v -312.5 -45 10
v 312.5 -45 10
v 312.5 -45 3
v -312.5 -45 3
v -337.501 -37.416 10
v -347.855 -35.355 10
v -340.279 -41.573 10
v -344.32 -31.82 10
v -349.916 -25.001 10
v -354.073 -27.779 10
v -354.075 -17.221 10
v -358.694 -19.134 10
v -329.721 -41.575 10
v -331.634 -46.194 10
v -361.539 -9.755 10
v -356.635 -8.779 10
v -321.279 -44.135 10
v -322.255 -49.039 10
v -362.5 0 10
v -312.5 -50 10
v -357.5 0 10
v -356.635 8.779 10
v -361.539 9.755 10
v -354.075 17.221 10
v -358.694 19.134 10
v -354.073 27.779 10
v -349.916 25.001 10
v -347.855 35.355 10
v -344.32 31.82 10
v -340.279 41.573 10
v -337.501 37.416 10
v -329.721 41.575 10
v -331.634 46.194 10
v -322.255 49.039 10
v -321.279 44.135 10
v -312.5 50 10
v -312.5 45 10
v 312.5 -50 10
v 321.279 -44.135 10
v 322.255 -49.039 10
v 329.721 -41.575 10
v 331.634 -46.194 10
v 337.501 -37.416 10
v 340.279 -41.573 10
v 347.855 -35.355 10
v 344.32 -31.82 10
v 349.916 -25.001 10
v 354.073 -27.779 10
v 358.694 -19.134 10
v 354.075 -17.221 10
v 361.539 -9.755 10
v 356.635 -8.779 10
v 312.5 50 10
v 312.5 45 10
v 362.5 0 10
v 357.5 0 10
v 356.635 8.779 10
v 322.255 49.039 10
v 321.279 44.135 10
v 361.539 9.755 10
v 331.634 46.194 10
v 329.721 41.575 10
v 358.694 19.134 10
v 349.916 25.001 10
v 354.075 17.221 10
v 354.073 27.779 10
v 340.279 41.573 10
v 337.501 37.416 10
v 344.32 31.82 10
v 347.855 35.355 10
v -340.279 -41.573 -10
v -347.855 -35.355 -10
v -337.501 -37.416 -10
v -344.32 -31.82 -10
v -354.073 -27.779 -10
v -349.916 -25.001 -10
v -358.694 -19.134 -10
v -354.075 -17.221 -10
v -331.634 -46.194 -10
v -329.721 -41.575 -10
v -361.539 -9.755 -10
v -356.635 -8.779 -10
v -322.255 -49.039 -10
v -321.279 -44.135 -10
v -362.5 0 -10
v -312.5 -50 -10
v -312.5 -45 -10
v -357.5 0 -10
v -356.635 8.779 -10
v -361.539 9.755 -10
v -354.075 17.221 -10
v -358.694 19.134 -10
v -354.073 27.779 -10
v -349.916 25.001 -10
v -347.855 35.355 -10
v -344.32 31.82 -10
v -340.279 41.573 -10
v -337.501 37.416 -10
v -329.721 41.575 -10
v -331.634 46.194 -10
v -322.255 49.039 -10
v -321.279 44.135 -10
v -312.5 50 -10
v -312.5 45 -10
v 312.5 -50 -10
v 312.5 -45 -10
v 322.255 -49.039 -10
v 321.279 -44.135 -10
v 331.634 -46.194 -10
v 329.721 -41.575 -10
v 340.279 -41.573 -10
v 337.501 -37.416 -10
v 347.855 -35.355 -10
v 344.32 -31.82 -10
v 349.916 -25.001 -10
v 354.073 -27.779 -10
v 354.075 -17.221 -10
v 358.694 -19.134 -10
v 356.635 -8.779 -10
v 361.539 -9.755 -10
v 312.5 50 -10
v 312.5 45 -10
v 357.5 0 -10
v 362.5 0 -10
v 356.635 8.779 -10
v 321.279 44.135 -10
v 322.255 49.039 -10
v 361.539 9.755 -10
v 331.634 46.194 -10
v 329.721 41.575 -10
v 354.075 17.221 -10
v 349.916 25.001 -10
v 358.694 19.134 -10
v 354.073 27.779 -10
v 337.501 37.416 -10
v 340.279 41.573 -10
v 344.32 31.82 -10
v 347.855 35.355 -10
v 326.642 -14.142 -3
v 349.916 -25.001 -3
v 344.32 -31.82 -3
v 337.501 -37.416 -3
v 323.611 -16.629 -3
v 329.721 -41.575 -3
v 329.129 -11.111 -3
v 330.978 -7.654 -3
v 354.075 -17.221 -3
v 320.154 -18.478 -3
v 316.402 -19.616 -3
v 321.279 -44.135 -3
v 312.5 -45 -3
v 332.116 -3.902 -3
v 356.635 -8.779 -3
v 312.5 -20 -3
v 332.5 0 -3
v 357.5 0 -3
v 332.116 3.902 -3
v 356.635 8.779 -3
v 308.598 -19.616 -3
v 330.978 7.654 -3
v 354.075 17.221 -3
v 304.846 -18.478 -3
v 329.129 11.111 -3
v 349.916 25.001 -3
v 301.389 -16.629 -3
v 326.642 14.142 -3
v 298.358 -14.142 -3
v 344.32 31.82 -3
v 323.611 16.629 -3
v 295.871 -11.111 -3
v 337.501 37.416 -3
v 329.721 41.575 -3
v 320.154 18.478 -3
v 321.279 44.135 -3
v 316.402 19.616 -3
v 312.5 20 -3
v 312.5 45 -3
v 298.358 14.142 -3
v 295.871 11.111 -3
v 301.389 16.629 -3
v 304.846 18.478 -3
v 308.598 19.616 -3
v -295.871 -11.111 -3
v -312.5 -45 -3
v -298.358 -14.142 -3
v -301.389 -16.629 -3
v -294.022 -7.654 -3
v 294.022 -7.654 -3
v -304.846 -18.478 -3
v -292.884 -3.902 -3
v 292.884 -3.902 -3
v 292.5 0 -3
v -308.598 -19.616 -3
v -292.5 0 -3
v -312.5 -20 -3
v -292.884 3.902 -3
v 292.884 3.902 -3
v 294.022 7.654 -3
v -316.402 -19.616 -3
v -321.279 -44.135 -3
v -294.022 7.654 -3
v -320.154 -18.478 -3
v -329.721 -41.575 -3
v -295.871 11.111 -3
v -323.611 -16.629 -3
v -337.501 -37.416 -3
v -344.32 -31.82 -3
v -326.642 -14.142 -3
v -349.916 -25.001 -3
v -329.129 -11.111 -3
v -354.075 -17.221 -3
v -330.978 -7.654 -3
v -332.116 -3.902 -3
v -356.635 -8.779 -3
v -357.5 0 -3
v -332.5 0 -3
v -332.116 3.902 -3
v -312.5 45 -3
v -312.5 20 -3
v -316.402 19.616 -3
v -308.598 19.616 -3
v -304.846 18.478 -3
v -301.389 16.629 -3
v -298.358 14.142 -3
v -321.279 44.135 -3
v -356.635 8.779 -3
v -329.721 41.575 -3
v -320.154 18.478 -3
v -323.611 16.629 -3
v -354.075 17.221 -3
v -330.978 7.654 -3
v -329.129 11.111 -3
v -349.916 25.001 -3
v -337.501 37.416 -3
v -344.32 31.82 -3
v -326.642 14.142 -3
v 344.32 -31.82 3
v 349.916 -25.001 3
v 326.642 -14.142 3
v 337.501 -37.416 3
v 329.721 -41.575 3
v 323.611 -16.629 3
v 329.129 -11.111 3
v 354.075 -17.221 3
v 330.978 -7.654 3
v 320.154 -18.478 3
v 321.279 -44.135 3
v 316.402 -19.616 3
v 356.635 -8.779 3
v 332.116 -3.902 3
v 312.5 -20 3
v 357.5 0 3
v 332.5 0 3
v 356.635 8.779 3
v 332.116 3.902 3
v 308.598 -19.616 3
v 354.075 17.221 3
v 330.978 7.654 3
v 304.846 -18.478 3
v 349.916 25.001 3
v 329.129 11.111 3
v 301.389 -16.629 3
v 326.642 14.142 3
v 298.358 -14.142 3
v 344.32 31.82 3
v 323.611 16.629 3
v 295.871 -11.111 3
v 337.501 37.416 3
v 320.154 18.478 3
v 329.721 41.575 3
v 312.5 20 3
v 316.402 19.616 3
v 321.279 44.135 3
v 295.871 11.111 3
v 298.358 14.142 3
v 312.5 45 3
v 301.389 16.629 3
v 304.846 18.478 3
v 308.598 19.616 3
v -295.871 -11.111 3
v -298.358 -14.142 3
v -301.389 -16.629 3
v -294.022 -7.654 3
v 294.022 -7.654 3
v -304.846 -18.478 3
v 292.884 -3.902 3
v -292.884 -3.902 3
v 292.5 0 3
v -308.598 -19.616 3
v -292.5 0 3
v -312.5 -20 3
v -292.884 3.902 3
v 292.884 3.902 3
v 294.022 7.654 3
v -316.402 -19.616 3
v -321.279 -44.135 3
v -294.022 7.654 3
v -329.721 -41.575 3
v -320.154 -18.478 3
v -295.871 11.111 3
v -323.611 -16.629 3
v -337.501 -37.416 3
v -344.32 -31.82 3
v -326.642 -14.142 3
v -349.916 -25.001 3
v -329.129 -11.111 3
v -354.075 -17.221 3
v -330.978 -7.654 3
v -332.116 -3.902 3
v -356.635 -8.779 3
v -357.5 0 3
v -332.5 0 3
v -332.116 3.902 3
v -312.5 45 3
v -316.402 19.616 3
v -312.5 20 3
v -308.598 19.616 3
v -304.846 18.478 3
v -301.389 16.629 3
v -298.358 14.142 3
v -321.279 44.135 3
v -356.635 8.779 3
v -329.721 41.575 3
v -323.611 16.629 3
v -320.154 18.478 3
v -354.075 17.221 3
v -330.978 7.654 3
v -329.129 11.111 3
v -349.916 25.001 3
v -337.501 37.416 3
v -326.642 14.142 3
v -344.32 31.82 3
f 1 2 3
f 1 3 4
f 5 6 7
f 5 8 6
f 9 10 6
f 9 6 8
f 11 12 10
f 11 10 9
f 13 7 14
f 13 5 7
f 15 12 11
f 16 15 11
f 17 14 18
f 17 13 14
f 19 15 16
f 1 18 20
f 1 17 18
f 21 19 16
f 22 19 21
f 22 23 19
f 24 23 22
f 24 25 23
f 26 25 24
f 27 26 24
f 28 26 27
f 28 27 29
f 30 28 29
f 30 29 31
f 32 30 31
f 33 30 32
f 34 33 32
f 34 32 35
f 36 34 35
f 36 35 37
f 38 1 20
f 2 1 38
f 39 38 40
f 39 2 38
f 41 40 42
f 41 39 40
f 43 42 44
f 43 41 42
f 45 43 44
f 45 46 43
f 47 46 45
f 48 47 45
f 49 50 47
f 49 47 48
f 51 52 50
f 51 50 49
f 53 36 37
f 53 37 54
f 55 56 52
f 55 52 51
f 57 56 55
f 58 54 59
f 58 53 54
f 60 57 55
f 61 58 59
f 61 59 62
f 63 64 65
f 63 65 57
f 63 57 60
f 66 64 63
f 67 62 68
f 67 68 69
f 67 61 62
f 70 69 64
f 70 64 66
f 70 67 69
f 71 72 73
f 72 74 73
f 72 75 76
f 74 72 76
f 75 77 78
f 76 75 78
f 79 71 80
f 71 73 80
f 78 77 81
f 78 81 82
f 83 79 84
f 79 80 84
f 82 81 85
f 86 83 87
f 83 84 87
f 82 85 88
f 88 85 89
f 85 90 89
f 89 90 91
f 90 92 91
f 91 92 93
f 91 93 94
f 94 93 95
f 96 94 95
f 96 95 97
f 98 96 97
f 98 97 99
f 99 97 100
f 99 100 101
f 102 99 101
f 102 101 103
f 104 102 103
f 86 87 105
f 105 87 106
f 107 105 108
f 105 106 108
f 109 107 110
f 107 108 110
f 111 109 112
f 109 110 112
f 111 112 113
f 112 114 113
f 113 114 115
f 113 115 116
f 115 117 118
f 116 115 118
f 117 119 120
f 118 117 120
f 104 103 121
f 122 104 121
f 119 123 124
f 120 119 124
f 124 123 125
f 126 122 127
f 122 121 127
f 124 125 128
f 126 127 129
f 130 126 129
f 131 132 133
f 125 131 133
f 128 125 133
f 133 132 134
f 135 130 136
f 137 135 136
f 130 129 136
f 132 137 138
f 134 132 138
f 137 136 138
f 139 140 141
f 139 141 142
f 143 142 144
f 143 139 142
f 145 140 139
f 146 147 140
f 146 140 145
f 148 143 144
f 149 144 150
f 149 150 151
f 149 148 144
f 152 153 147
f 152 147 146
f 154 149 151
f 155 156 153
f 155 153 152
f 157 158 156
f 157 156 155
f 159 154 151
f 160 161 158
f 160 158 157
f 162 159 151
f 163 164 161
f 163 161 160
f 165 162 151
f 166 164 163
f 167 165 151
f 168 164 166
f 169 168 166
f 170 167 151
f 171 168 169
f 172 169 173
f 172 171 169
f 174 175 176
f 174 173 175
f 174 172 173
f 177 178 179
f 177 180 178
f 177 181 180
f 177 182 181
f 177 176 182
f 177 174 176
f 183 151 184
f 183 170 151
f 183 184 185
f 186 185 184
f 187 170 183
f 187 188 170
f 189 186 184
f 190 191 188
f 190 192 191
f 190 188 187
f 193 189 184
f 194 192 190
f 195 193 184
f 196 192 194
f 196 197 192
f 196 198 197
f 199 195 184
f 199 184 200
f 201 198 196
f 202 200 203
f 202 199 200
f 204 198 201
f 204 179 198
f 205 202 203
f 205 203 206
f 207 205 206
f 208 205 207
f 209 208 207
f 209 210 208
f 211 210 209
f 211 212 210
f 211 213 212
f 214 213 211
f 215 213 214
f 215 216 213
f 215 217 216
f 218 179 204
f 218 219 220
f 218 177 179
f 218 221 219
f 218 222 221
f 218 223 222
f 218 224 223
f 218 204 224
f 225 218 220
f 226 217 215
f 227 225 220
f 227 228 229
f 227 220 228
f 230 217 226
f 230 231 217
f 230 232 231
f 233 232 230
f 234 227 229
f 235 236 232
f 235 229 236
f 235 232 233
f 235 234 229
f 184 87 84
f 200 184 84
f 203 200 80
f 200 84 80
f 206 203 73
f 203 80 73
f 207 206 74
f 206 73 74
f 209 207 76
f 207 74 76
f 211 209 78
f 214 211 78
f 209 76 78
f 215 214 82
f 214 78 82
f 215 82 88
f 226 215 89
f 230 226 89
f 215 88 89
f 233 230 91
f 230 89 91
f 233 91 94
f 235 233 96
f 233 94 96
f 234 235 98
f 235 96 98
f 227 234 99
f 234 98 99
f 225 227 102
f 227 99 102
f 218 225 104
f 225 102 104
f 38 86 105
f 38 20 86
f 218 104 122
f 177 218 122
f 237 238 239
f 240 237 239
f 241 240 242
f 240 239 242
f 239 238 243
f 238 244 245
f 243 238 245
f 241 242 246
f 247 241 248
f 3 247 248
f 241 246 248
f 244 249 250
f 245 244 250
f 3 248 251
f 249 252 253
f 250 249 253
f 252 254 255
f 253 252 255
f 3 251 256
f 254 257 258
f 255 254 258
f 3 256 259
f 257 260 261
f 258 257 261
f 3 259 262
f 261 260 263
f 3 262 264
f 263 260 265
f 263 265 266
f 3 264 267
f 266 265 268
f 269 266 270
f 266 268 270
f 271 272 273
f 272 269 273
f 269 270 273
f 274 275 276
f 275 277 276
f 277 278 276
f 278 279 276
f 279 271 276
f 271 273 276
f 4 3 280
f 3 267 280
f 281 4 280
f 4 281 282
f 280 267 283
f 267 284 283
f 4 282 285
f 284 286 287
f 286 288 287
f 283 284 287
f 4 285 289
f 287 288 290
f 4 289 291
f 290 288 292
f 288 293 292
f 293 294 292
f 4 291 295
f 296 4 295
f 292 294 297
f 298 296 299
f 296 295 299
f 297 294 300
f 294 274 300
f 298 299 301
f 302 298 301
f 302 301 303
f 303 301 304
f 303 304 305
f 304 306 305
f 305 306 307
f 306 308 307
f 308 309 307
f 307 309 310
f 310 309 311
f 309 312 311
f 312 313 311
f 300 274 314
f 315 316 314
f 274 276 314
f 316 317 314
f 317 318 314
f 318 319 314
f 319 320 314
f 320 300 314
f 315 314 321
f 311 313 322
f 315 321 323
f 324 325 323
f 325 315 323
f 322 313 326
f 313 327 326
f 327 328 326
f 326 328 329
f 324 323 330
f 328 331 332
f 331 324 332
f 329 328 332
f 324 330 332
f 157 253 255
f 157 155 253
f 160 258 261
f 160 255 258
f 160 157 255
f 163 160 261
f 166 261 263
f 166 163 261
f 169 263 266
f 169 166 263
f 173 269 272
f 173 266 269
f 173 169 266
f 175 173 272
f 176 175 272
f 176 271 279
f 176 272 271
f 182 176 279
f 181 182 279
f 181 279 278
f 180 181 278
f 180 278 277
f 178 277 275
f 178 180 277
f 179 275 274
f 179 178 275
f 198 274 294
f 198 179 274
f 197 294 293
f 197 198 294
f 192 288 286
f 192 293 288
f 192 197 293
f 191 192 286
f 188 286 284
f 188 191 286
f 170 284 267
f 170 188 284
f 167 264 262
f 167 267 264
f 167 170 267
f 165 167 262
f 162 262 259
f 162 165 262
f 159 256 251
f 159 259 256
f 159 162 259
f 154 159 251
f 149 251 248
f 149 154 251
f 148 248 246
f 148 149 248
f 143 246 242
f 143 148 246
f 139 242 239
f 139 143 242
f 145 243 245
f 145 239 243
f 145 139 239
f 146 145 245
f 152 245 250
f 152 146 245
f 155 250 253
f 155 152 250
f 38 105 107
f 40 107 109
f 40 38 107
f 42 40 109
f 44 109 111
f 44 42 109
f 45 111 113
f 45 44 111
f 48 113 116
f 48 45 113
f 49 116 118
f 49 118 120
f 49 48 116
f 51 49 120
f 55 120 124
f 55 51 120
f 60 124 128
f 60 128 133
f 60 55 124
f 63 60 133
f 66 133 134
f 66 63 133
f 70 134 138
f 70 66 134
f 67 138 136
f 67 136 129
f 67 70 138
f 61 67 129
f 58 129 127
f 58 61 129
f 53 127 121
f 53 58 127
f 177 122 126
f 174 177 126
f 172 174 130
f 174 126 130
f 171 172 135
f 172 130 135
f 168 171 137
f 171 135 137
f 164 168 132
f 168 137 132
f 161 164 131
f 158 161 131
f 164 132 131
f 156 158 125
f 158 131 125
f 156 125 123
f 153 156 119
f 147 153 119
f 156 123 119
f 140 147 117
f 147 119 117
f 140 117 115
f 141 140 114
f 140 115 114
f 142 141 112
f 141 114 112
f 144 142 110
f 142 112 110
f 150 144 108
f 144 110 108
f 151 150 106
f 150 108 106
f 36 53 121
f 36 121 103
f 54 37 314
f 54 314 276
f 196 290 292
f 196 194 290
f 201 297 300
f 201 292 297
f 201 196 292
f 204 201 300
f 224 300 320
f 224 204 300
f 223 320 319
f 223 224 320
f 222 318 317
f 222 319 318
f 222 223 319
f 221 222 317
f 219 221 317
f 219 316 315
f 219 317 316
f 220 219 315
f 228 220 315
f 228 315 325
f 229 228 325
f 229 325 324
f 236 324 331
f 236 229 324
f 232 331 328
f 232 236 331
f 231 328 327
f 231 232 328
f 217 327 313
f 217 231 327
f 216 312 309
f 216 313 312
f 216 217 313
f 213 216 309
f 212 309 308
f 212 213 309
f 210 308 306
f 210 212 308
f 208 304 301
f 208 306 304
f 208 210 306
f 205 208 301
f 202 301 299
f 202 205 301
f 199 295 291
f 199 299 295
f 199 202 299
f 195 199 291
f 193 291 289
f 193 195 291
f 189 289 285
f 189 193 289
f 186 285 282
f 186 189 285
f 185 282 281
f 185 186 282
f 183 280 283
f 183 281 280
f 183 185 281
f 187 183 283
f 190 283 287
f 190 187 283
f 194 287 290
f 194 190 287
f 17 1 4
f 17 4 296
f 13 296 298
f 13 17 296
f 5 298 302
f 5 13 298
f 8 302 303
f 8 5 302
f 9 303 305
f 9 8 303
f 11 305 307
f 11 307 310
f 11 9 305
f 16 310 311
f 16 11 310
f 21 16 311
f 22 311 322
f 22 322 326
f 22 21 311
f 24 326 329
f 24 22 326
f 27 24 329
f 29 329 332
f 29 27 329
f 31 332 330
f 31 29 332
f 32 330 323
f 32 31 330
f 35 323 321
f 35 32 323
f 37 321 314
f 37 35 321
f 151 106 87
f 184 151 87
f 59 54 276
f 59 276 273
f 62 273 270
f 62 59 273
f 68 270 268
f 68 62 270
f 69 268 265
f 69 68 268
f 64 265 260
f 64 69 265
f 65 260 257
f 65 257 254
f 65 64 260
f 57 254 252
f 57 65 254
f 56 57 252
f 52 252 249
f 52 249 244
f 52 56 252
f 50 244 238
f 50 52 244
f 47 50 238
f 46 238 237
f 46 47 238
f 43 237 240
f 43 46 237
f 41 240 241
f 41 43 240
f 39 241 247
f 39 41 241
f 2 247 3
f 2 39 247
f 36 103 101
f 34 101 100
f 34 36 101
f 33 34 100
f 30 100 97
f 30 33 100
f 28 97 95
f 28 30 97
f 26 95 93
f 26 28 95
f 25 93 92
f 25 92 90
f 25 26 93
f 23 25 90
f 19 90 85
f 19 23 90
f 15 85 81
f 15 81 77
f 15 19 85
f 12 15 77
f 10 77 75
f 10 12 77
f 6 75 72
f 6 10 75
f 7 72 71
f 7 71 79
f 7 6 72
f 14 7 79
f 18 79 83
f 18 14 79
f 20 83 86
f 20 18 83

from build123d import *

# Parameters (mm, degrees)
SKETCH1_R           = 20
BOSS_EXTRUDE1_DEPTH = 10
CUT_EXTRUDE1_DEPTH  = 7


with BuildPart() as part:
    # Sketch1 → Boss-Extrude1 (new, symmetric)
    with BuildSketch(Plane.XY):
        with BuildLine():
            Line((-312.5, -50), (312.5, -50))
            ThreePointArc((312.5, -50), (362.5, 0), (312.5, 50))
            Line((312.5, 50), (-312.5, 50))
            ThreePointArc((-312.5, 50), (-362.5, 0), (-312.5, -50))
        make_face()
        with Locations((312.5, 0)):
            Circle(SKETCH1_R, mode=Mode.SUBTRACT)
        with Locations((-312.5, 0)):
            Circle(SKETCH1_R, mode=Mode.SUBTRACT)
    extrude(amount=BOSS_EXTRUDE1_DEPTH, both=True)

    # Sketch2 → Cut-Extrude1 (cut)
    with BuildSketch(Plane(origin=(0, 0, -10), x_dir=(-1, 0, 0), z_dir=(0, 0, -1))):
        with BuildLine():
            Line((312.5, 45), (-312.5, 45))
            ThreePointArc((-312.5, 45), (-357.5, 0), (-312.5, -45))
            Line((-312.5, -45), (312.5, -45))
            ThreePointArc((312.5, -45), (357.5, 0), (312.5, 45))
        make_face()
    cut_extrude1 = extrude(amount=-CUT_EXTRUDE1_DEPTH, mode=Mode.SUBTRACT)

    # Mirror2: Cut-Extrude1 across plane
    add(cut_extrude1.mirror(Plane.XY), mode=Mode.SUBTRACT)


solid = part.part
